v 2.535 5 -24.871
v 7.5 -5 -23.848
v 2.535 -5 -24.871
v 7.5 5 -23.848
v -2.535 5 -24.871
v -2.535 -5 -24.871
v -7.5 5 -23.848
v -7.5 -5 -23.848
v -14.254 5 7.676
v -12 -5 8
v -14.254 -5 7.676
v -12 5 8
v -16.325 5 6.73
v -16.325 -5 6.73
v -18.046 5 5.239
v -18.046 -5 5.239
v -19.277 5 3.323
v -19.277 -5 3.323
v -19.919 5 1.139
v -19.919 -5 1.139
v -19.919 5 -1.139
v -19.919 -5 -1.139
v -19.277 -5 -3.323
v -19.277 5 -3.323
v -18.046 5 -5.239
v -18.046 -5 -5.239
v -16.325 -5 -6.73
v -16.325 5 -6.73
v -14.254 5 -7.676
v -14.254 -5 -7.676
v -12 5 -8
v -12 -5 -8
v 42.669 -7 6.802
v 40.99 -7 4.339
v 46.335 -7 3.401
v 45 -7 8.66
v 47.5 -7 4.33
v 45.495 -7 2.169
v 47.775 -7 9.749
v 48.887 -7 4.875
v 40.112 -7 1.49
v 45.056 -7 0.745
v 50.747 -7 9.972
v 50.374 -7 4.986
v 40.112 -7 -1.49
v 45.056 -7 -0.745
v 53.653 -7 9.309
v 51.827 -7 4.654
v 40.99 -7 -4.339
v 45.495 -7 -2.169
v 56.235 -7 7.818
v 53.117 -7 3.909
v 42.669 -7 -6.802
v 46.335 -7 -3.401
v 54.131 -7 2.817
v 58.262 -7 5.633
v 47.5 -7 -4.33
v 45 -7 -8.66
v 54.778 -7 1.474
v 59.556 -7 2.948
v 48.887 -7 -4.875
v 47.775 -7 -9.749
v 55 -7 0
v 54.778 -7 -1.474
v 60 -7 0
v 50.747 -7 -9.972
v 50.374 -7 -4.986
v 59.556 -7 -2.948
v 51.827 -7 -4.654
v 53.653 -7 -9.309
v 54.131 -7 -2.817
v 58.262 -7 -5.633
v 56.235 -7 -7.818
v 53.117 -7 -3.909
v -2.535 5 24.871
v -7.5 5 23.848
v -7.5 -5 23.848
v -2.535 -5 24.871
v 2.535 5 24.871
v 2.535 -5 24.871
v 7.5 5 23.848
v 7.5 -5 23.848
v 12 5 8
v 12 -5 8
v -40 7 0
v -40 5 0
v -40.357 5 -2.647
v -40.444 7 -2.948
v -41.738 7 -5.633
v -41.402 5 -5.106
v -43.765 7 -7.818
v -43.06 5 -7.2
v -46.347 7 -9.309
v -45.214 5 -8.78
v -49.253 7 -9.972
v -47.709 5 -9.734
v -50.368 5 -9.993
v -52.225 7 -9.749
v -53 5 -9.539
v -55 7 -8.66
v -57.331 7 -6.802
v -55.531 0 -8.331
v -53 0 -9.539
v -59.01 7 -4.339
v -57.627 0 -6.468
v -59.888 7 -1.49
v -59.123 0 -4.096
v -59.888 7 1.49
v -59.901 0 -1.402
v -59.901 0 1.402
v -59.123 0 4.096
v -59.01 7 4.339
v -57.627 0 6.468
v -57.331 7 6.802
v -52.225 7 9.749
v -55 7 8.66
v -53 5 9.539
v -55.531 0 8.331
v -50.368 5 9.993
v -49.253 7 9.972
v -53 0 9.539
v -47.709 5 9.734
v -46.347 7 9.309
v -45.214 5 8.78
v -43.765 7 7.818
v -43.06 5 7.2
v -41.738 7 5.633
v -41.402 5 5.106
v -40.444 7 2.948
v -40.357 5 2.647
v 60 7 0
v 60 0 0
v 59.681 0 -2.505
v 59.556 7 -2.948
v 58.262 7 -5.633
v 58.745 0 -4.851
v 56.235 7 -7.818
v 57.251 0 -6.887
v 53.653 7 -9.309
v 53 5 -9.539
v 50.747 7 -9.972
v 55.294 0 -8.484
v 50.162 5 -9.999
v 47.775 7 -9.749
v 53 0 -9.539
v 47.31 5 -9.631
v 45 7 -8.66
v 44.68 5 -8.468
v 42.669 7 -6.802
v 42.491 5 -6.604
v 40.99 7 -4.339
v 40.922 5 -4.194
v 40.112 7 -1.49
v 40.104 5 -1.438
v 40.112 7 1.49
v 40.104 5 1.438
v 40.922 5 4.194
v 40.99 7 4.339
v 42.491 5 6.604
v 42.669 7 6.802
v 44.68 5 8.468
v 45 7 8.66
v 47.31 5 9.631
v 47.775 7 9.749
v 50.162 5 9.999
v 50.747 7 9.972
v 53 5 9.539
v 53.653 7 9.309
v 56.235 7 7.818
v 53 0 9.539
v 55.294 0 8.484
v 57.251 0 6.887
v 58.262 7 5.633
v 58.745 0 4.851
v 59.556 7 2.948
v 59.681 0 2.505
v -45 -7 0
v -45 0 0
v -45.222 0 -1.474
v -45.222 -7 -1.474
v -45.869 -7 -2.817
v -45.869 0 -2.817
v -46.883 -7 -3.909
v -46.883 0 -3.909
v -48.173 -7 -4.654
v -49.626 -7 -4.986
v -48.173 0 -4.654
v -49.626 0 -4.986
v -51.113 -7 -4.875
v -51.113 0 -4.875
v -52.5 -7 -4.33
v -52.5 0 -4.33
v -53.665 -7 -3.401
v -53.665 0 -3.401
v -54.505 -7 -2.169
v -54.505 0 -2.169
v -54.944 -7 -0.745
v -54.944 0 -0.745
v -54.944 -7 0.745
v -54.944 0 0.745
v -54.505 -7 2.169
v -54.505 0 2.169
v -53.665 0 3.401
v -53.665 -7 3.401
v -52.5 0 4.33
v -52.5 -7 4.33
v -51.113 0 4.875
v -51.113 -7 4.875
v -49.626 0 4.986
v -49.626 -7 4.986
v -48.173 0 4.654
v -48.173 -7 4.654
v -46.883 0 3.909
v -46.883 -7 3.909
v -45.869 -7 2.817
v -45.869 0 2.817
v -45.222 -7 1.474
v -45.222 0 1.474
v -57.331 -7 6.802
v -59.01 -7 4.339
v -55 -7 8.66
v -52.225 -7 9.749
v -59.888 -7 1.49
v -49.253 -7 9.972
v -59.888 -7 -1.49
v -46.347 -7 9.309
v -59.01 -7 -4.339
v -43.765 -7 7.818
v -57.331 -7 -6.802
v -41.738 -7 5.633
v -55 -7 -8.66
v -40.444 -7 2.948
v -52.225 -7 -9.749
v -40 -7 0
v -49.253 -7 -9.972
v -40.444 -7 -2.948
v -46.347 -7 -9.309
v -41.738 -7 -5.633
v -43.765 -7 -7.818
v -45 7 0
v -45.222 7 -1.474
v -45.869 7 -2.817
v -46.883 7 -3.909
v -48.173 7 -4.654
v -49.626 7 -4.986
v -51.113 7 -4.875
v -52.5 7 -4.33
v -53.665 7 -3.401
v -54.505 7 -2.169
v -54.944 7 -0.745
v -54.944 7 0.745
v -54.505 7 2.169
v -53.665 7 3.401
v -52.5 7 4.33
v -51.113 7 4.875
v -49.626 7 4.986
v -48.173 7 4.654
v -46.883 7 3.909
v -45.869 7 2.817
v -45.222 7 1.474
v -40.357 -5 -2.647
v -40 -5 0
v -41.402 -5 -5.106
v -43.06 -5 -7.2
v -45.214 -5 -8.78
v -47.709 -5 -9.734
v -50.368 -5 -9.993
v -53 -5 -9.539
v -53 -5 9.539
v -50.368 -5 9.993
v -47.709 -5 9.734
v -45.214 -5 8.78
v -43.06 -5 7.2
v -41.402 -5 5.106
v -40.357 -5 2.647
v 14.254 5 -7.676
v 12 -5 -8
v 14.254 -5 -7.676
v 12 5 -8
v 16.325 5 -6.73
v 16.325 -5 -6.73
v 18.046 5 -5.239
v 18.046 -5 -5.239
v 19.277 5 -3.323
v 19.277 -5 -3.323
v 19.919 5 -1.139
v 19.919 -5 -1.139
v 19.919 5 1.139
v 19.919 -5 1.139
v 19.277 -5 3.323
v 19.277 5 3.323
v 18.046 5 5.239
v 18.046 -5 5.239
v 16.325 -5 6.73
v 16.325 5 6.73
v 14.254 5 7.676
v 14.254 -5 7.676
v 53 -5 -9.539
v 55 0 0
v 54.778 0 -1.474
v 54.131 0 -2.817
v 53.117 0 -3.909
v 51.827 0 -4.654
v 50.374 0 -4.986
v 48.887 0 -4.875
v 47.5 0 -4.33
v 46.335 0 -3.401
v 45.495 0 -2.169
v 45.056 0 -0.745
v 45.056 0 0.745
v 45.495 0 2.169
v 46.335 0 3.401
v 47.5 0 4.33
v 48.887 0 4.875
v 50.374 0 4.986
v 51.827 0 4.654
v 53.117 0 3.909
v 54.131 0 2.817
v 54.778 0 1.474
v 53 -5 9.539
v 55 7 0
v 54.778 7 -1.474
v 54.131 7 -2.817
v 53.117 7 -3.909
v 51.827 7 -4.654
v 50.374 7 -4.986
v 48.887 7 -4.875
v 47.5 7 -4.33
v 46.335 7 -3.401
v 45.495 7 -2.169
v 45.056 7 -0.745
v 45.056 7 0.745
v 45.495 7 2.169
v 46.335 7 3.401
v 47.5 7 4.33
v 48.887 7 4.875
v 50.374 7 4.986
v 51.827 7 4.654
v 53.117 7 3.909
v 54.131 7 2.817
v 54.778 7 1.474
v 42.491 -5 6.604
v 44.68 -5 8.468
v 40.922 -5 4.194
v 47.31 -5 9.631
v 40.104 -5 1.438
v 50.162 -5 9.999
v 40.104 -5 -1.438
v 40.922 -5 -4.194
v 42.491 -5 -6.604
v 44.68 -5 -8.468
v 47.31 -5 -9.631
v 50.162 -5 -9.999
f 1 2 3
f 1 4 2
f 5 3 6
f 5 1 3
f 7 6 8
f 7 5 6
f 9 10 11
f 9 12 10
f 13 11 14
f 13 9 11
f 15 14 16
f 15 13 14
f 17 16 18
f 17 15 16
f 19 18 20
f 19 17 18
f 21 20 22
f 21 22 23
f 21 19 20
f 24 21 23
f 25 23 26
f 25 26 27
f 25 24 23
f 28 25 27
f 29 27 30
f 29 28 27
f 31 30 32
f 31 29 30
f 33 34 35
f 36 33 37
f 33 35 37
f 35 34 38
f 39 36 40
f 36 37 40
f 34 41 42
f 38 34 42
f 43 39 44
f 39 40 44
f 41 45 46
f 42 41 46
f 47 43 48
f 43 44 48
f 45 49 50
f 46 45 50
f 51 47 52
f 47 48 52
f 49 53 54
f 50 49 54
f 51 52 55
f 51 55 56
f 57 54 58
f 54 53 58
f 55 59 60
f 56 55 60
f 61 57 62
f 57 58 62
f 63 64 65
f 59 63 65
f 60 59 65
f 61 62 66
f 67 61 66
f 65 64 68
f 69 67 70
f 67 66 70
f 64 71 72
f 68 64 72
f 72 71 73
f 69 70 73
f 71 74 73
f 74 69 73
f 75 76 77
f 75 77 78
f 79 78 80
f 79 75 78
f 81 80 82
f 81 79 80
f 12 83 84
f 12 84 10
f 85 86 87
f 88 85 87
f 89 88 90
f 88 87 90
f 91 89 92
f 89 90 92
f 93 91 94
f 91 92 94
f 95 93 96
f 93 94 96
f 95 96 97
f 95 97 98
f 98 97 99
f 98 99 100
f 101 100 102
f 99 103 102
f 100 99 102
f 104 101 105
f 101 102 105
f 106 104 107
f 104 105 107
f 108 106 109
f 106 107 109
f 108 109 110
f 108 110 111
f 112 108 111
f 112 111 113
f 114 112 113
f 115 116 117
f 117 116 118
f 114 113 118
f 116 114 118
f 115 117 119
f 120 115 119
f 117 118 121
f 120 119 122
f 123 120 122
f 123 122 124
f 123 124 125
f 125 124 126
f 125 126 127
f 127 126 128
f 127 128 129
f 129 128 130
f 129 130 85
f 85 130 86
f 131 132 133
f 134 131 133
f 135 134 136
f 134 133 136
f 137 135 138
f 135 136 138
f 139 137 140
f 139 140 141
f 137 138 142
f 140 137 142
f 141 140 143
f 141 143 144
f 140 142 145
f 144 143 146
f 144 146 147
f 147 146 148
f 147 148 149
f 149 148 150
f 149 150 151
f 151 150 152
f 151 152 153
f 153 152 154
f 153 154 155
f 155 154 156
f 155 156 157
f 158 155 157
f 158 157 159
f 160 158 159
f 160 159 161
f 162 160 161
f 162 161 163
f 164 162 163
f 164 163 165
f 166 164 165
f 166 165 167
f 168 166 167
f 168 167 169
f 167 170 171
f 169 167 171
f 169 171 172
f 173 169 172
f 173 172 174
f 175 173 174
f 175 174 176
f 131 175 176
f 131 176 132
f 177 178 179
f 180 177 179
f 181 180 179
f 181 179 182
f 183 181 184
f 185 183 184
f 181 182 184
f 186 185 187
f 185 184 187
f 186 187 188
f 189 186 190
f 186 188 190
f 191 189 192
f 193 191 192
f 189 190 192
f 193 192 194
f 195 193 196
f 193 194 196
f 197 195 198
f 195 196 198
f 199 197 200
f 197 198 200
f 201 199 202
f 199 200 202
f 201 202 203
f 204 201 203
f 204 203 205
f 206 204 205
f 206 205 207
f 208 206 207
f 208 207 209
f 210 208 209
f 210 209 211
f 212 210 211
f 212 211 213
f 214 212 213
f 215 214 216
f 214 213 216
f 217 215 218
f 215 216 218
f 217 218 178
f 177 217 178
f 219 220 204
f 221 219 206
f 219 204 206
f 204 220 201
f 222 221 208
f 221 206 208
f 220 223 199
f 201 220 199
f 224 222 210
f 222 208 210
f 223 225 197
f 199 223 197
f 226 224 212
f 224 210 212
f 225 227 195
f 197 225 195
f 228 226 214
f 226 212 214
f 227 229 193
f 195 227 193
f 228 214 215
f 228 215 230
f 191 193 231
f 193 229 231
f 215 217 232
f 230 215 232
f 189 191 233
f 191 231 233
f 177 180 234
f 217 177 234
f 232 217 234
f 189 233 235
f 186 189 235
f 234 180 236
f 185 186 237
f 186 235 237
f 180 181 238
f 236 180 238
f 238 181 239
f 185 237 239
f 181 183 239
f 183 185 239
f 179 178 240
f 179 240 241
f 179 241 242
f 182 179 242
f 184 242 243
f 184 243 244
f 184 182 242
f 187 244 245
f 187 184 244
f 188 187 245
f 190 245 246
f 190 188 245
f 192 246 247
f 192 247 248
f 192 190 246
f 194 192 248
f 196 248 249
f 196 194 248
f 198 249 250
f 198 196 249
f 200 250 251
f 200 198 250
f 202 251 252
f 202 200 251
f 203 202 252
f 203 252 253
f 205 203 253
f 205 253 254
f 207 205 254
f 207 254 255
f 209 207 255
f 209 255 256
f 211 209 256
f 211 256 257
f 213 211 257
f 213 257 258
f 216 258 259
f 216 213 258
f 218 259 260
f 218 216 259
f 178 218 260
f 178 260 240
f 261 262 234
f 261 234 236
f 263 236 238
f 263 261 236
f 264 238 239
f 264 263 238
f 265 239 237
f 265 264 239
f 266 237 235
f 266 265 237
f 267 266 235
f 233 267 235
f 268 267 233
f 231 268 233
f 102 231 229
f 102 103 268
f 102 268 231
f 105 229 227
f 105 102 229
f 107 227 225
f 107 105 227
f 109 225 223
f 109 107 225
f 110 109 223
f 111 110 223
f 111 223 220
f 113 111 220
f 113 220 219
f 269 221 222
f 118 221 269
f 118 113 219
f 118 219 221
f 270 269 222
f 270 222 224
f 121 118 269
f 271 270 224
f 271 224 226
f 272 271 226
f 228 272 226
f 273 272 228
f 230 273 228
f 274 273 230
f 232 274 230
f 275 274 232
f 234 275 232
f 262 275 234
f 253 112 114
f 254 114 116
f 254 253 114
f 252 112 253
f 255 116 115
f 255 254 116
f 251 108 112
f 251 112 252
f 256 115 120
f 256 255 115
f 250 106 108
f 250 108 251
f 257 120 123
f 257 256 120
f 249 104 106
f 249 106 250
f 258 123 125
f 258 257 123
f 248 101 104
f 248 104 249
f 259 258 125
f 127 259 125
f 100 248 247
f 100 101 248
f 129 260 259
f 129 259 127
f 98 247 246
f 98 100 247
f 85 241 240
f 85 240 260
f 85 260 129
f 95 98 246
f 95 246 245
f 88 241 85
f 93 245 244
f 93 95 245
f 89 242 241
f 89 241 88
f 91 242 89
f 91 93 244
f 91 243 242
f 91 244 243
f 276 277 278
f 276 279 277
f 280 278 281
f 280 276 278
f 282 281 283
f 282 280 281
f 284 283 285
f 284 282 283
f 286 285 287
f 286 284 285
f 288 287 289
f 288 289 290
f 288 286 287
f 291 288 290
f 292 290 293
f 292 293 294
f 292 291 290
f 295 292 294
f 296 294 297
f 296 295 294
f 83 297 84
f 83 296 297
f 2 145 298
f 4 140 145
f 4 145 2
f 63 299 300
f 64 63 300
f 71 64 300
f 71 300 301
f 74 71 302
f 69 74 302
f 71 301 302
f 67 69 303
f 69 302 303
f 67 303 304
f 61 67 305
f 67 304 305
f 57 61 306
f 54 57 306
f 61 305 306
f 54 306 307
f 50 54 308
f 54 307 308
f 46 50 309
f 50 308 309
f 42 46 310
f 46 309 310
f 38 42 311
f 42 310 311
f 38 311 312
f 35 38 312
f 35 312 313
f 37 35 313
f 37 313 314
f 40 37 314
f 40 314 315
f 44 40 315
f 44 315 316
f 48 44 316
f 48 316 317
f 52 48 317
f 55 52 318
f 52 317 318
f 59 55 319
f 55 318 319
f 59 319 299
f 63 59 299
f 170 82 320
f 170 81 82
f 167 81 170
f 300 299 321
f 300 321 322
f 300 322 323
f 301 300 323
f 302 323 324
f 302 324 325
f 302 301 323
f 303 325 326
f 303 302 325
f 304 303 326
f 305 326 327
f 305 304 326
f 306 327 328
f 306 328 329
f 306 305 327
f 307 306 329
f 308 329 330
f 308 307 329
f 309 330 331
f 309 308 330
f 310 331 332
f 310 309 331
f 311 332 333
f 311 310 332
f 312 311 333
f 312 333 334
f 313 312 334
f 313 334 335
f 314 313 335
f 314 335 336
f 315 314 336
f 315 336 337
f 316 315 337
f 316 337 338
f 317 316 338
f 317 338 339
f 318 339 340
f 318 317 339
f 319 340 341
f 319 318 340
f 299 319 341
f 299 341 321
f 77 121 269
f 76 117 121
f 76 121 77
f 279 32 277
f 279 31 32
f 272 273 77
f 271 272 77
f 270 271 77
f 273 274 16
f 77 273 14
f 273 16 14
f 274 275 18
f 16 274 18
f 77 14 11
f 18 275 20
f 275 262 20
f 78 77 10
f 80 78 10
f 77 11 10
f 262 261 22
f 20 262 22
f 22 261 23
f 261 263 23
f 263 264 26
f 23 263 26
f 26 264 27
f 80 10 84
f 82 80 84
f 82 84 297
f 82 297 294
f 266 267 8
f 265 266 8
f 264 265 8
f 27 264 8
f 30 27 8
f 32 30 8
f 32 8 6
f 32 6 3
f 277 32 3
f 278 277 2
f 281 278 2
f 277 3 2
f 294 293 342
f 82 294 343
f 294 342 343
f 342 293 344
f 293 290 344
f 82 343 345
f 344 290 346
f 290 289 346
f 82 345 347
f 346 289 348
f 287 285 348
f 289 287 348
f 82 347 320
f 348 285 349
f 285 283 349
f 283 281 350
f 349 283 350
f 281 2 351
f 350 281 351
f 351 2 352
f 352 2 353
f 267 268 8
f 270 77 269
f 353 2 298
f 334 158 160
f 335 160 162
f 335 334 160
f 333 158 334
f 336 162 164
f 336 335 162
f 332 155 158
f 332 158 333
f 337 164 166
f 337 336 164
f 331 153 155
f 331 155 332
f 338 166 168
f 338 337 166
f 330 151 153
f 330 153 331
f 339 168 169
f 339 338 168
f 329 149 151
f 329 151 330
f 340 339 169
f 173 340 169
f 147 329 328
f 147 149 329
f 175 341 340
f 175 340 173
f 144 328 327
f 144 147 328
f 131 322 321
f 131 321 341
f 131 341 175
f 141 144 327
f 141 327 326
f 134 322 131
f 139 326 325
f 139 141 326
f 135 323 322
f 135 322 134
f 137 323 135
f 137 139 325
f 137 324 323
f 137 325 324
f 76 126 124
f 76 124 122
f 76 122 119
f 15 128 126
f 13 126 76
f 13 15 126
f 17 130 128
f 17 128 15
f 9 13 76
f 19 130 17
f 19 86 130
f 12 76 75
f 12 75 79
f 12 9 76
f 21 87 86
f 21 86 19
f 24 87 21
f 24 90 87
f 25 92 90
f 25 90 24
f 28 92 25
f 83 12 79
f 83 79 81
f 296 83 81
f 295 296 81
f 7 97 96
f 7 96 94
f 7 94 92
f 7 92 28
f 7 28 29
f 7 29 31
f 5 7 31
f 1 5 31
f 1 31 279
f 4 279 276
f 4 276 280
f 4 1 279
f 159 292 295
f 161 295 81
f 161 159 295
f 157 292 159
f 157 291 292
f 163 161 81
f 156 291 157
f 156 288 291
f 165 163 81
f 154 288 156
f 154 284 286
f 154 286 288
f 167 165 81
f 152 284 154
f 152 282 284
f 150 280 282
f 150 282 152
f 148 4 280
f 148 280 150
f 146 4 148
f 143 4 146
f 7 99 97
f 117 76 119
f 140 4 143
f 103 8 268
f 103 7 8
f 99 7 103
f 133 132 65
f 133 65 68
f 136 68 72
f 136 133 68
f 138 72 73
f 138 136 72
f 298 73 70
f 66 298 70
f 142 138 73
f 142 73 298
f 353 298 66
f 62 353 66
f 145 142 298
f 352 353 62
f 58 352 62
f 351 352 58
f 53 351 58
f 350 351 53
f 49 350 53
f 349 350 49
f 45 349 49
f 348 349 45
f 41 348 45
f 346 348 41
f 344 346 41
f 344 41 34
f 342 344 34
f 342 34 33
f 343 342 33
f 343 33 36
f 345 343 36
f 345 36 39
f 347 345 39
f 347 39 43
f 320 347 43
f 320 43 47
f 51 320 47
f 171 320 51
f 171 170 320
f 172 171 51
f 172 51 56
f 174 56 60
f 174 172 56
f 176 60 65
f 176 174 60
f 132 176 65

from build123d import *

# Parameters (mm, degrees)
SALIENTE_EXTRUIR1_DEPTH      = 5
SALIENTE_EXTRUIR1_DEPTH_BACK = 5
SALIENTE_EXTRUIR2_DEPTH      = 7
SALIENTE_EXTRUIR2_DEPTH_BACK = 7
CROQUIS6_3_R                 = 10
CROQUIS6_3_R_2               = 5


with BuildPart() as part:
    # Croquis6 → Saliente-Extruir1 (new, two sides: drawn at the far end of the back side and taken through both)
    with BuildSketch(Plane(origin=(0, 0, 0), x_dir=(1, 0, 0), z_dir=(0, 1, 0)).offset(-SALIENTE_EXTRUIR1_DEPTH_BACK)):
        with BuildLine():
            Line((-7.5, 23.848480035), (-53, 9.539392014))
            ThreePointArc((-53, 9.539392014), (-44.083920217, 8.062257748), (-40, 0))
            ThreePointArc((-40, 0), (-44.083920217, -8.062257748), (-53, -9.539392014))
            Line((-53, -9.539392014), (-7.5, -23.848480035))
            ThreePointArc((-7.5, -23.848480035), (0, -25), (7.5, -23.848480035))
            Line((7.5, -23.848480035), (53, -9.539392014))
            ThreePointArc((53, -9.539392014), (40, 0), (53, 9.539392014))
            Line((53, 9.539392014), (7.5, 23.848480035))
            ThreePointArc((7.5, 23.848480035), (0, 25), (-7.5, 23.848480035))
        make_face()
        with BuildLine():
            Line((12, -8), (-12, -8))
            ThreePointArc((-12, -8), (-20, 0), (-12, 8))
            Line((-12, 8), (12, 8))
            ThreePointArc((12, 8), (20, 0), (12, -8))
        make_face(mode=Mode.SUBTRACT)
    extrude(amount=SALIENTE_EXTRUIR1_DEPTH + SALIENTE_EXTRUIR1_DEPTH_BACK)

    # Croquis6<3> → Saliente-Extruir2 (add, two sides: drawn at the far end of the back side and taken through both)
    # profile 1 of 2: a face of its own
    with BuildSketch(Plane(origin=(0, 0, 0), x_dir=(1, 0, 0), z_dir=(0, 1, 0)).offset(-SALIENTE_EXTRUIR2_DEPTH_BACK)):
        with Locations((-50, 0)):
            Circle(CROQUIS6_3_R)
        with Locations((-50, 0)):
            Circle(CROQUIS6_3_R_2, mode=Mode.SUBTRACT)
    # profile 2 of 2: a face of its own
    with BuildSketch(Plane(origin=(0, 0, 0), x_dir=(1, 0, 0), z_dir=(0, 1, 0)).offset(-SALIENTE_EXTRUIR2_DEPTH_BACK)):
        with Locations((50, 0)):
            Circle(CROQUIS6_3_R)
        with Locations((50, 0)):
            Circle(CROQUIS6_3_R_2, mode=Mode.SUBTRACT)
    extrude(amount=SALIENTE_EXTRUIR2_DEPTH + SALIENTE_EXTRUIR2_DEPTH_BACK)


solid = part.part
